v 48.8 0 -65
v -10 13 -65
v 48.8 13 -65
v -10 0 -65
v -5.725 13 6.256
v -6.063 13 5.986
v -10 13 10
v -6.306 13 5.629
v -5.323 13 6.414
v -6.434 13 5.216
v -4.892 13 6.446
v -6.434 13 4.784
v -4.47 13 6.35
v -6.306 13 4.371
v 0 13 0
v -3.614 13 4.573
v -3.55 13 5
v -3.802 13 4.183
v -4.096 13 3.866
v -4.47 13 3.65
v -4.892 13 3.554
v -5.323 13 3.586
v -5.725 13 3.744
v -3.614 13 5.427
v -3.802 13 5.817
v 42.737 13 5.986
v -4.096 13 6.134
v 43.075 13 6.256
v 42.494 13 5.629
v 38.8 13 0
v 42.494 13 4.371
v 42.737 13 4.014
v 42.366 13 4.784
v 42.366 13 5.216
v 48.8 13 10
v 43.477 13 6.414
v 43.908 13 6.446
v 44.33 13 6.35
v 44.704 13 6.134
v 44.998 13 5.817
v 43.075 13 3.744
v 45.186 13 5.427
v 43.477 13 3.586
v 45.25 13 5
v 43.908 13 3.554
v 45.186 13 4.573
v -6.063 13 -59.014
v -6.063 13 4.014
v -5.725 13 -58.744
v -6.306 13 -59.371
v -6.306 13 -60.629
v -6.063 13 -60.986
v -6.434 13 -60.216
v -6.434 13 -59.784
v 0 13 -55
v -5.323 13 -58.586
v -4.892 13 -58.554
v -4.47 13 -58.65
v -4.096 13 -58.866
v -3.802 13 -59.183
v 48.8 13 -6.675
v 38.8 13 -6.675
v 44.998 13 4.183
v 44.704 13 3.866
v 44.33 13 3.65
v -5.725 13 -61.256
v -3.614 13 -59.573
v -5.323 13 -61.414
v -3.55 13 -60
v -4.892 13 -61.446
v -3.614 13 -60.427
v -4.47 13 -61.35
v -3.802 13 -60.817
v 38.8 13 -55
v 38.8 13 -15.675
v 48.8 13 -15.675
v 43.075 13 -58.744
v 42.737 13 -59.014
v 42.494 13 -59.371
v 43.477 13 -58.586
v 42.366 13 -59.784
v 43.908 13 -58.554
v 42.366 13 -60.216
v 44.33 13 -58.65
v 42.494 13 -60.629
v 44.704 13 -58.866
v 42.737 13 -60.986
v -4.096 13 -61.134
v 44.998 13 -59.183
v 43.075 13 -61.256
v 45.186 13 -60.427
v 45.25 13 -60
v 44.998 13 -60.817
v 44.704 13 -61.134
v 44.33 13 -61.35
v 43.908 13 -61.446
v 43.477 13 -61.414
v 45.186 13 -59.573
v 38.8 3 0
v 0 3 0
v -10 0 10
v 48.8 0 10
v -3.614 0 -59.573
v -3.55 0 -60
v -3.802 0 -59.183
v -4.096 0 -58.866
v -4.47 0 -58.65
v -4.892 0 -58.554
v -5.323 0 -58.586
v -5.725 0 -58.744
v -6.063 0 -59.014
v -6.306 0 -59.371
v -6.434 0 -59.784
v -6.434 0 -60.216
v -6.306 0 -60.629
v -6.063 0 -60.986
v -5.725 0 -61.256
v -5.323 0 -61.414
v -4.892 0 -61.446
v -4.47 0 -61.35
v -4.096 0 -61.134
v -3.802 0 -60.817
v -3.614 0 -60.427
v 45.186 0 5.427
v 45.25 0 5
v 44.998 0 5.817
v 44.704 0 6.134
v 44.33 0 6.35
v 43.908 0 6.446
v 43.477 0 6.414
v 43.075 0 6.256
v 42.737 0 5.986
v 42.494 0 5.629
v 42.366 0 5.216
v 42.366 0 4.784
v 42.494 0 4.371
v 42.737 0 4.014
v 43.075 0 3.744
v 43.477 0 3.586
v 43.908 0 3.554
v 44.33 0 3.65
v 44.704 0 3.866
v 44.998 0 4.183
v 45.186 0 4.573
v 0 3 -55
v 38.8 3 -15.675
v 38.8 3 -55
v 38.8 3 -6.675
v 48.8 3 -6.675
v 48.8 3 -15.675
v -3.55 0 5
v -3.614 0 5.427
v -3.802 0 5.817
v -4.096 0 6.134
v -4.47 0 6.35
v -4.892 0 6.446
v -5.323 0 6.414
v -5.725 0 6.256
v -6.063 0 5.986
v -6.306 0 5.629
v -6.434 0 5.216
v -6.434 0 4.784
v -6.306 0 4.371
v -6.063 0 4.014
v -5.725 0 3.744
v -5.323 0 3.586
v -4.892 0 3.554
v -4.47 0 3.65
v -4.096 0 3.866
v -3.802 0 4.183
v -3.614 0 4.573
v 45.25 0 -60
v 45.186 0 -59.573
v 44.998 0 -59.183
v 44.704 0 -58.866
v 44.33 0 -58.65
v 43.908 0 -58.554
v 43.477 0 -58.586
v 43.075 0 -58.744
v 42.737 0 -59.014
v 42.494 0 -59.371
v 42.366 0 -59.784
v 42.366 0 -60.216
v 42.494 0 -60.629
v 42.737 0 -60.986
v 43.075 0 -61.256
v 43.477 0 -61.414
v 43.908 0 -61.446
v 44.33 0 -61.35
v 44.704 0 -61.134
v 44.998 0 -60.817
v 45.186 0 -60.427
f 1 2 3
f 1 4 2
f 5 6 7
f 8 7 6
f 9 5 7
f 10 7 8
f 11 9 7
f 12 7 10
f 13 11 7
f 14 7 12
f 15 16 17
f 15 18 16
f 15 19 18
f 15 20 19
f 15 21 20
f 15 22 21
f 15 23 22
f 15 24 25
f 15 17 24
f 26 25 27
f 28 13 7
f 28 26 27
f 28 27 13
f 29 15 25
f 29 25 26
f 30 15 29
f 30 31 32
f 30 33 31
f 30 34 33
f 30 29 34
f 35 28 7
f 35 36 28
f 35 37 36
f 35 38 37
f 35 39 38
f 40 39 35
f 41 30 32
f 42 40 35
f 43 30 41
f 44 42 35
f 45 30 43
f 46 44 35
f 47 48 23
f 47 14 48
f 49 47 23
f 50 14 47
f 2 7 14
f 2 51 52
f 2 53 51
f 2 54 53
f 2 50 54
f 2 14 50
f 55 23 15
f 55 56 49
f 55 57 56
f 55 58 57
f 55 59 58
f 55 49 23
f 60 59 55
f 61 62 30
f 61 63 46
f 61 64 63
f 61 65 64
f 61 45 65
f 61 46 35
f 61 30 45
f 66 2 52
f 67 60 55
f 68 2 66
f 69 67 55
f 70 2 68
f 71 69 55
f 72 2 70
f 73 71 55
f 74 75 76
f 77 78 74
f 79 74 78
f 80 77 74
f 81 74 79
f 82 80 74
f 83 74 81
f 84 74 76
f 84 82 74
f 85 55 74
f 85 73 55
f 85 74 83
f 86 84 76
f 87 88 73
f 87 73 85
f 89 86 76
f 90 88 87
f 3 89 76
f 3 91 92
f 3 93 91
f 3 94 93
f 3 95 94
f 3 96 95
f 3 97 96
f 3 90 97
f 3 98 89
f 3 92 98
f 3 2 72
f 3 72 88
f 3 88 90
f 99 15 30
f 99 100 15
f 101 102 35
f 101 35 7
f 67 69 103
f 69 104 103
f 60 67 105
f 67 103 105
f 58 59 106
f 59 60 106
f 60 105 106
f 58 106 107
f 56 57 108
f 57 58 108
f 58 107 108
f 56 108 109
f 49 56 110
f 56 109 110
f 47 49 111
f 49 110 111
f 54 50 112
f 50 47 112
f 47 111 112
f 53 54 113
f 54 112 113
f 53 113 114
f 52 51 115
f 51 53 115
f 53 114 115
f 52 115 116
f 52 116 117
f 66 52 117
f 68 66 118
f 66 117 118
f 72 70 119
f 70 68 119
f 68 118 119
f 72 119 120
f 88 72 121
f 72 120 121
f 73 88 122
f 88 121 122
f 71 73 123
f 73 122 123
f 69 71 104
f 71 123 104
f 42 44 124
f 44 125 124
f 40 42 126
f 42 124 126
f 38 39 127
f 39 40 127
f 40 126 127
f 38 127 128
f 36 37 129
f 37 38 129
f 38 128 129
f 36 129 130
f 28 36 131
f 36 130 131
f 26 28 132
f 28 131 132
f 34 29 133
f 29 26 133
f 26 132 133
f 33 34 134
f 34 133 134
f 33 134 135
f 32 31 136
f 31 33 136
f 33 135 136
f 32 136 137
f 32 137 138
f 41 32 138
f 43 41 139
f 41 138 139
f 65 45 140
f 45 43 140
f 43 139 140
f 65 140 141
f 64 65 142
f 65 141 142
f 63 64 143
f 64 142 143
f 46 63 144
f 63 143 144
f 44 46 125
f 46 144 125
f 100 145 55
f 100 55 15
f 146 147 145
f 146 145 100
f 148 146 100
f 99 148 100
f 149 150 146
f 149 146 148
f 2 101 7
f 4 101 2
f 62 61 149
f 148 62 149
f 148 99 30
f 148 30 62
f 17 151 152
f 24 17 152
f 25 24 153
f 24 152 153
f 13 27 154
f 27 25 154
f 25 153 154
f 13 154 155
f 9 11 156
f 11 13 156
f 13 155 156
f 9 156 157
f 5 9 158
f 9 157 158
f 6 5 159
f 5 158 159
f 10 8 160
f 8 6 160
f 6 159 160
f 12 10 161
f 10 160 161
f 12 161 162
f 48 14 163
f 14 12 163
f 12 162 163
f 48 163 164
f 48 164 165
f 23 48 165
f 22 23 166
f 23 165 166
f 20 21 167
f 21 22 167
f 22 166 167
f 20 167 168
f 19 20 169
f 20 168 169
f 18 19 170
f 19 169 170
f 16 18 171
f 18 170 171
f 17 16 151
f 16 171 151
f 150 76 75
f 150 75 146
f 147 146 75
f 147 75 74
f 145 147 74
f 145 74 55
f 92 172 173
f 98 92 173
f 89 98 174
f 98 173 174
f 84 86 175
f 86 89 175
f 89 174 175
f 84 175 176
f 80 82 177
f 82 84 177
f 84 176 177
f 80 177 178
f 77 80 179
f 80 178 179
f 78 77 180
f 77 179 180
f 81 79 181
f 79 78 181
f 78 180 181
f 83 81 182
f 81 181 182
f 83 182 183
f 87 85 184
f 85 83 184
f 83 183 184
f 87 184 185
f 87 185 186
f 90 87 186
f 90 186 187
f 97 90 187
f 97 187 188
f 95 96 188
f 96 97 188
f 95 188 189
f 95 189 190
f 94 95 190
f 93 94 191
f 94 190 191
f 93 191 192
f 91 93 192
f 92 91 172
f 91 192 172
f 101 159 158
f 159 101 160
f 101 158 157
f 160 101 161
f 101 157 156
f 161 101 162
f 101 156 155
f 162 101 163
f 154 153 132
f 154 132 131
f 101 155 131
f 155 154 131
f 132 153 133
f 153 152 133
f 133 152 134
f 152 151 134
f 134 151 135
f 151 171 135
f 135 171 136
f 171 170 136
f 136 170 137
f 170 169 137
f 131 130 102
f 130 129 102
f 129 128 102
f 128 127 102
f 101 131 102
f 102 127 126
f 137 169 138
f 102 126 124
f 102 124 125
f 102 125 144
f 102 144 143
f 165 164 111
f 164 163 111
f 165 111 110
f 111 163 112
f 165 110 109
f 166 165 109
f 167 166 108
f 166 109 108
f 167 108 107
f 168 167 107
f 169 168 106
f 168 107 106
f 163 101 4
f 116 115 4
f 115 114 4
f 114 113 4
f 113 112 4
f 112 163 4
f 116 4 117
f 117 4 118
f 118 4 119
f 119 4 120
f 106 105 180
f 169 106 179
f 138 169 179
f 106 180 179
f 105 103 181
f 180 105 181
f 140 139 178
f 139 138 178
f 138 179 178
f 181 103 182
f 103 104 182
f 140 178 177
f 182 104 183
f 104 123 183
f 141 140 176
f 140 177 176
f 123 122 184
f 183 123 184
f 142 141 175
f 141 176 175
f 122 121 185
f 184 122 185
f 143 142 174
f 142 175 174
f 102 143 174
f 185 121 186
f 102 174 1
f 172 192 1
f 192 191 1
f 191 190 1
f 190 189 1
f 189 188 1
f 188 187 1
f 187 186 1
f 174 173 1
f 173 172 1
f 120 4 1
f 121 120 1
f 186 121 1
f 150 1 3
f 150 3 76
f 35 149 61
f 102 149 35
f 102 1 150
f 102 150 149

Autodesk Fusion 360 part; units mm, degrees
sketch "Sketch1" plane through (0, 0, 0) normal (0, 1, 0) x (1, 0, 0)
  line L0 (0, 0) -> (38.8, 0)
  line L1 (38.8, 0) -> (38.8, 55)
  line L2 (38.8, 55) -> (0, 55)
  line L3 (0, 55) -> (0, 0)
  line L4 (-10, 65) -> (48.8, 65)
  line L5 (48.8, 65) -> (48.8, -10)
  line L6 (48.8, -10) -> (-10, -10)
  line L7 (-10, -10) -> (-10, 65)
  circle A0 centre (-5, 60) radius 1.45
  circle A1 centre (43.8, 60) radius 1.45
  circle A2 centre (-5, -5) radius 1.45
  circle A3 centre (43.8, -5) radius 1.45
  dimension "d1" = 55
  dimension "d2" = 38.8
  dimension "d3" = 10
  dimension "d4" = 10
  dimension "d5" = 10
  dimension "d6" = 10
  dimension "d7" = 2.9
  dimension "d8" = 2.9
  dimension "d9" = 2.9
  dimension "d10" = 2.9
  dimension "d11" = 5
  dimension "d12" = 5
  dimension "d13" = 5
  dimension "d14" = 5
  dimension "d15" = 5
  dimension "d16" = 5
  dimension "d17" = 5
  dimension "d18" = 5
extrude "Extrude1" add sketch "Sketch1" along normal blind 3 contours L0 L1 L2 L3
extrude "Extrude2" add sketch "Sketch1" along normal blind 13
sketch "Sketch2" plane through (48.8, 0, 0) normal (1, 0, 0) x (0, 0, -1)
  line L0 (-10, 0) -> (65, 0)
  line L1 (65, 0) -> (65, 13)
  line L2 (65, 13) -> (-10, 13)
  line L3 (-10, 13) -> (-10, 0)
  line L4 (-10, 13) -> (0, 13)
  line L5 (0, 0) -> (-10, 0)
  line L6 (-10, 0) -> (-10, 13)
  line L7 (0, 13) -> (6.675, 13)
  line L8 (6.675, 13) -> (6.675, 0)
  line L9 (6.675, 0) -> (0, 0)
  line L10 (6.675, 13) -> (15.675, 13)
  line L11 (15.675, 13) -> (15.675, 3)
  line L12 (15.675, 3) -> (6.675, 3)
  line L13 (6.675, 3) -> (6.675, 13)
  line L14 (65, 0) -> (-10, 0)
  dimension "d23" = 6.675
  dimension "d24" = 9
  dimension "d25" = 3
extrude "Extrude3" cut sketch "Sketch2" against normal blind 10 contours L2 L8 L10 L11 L12 L13
